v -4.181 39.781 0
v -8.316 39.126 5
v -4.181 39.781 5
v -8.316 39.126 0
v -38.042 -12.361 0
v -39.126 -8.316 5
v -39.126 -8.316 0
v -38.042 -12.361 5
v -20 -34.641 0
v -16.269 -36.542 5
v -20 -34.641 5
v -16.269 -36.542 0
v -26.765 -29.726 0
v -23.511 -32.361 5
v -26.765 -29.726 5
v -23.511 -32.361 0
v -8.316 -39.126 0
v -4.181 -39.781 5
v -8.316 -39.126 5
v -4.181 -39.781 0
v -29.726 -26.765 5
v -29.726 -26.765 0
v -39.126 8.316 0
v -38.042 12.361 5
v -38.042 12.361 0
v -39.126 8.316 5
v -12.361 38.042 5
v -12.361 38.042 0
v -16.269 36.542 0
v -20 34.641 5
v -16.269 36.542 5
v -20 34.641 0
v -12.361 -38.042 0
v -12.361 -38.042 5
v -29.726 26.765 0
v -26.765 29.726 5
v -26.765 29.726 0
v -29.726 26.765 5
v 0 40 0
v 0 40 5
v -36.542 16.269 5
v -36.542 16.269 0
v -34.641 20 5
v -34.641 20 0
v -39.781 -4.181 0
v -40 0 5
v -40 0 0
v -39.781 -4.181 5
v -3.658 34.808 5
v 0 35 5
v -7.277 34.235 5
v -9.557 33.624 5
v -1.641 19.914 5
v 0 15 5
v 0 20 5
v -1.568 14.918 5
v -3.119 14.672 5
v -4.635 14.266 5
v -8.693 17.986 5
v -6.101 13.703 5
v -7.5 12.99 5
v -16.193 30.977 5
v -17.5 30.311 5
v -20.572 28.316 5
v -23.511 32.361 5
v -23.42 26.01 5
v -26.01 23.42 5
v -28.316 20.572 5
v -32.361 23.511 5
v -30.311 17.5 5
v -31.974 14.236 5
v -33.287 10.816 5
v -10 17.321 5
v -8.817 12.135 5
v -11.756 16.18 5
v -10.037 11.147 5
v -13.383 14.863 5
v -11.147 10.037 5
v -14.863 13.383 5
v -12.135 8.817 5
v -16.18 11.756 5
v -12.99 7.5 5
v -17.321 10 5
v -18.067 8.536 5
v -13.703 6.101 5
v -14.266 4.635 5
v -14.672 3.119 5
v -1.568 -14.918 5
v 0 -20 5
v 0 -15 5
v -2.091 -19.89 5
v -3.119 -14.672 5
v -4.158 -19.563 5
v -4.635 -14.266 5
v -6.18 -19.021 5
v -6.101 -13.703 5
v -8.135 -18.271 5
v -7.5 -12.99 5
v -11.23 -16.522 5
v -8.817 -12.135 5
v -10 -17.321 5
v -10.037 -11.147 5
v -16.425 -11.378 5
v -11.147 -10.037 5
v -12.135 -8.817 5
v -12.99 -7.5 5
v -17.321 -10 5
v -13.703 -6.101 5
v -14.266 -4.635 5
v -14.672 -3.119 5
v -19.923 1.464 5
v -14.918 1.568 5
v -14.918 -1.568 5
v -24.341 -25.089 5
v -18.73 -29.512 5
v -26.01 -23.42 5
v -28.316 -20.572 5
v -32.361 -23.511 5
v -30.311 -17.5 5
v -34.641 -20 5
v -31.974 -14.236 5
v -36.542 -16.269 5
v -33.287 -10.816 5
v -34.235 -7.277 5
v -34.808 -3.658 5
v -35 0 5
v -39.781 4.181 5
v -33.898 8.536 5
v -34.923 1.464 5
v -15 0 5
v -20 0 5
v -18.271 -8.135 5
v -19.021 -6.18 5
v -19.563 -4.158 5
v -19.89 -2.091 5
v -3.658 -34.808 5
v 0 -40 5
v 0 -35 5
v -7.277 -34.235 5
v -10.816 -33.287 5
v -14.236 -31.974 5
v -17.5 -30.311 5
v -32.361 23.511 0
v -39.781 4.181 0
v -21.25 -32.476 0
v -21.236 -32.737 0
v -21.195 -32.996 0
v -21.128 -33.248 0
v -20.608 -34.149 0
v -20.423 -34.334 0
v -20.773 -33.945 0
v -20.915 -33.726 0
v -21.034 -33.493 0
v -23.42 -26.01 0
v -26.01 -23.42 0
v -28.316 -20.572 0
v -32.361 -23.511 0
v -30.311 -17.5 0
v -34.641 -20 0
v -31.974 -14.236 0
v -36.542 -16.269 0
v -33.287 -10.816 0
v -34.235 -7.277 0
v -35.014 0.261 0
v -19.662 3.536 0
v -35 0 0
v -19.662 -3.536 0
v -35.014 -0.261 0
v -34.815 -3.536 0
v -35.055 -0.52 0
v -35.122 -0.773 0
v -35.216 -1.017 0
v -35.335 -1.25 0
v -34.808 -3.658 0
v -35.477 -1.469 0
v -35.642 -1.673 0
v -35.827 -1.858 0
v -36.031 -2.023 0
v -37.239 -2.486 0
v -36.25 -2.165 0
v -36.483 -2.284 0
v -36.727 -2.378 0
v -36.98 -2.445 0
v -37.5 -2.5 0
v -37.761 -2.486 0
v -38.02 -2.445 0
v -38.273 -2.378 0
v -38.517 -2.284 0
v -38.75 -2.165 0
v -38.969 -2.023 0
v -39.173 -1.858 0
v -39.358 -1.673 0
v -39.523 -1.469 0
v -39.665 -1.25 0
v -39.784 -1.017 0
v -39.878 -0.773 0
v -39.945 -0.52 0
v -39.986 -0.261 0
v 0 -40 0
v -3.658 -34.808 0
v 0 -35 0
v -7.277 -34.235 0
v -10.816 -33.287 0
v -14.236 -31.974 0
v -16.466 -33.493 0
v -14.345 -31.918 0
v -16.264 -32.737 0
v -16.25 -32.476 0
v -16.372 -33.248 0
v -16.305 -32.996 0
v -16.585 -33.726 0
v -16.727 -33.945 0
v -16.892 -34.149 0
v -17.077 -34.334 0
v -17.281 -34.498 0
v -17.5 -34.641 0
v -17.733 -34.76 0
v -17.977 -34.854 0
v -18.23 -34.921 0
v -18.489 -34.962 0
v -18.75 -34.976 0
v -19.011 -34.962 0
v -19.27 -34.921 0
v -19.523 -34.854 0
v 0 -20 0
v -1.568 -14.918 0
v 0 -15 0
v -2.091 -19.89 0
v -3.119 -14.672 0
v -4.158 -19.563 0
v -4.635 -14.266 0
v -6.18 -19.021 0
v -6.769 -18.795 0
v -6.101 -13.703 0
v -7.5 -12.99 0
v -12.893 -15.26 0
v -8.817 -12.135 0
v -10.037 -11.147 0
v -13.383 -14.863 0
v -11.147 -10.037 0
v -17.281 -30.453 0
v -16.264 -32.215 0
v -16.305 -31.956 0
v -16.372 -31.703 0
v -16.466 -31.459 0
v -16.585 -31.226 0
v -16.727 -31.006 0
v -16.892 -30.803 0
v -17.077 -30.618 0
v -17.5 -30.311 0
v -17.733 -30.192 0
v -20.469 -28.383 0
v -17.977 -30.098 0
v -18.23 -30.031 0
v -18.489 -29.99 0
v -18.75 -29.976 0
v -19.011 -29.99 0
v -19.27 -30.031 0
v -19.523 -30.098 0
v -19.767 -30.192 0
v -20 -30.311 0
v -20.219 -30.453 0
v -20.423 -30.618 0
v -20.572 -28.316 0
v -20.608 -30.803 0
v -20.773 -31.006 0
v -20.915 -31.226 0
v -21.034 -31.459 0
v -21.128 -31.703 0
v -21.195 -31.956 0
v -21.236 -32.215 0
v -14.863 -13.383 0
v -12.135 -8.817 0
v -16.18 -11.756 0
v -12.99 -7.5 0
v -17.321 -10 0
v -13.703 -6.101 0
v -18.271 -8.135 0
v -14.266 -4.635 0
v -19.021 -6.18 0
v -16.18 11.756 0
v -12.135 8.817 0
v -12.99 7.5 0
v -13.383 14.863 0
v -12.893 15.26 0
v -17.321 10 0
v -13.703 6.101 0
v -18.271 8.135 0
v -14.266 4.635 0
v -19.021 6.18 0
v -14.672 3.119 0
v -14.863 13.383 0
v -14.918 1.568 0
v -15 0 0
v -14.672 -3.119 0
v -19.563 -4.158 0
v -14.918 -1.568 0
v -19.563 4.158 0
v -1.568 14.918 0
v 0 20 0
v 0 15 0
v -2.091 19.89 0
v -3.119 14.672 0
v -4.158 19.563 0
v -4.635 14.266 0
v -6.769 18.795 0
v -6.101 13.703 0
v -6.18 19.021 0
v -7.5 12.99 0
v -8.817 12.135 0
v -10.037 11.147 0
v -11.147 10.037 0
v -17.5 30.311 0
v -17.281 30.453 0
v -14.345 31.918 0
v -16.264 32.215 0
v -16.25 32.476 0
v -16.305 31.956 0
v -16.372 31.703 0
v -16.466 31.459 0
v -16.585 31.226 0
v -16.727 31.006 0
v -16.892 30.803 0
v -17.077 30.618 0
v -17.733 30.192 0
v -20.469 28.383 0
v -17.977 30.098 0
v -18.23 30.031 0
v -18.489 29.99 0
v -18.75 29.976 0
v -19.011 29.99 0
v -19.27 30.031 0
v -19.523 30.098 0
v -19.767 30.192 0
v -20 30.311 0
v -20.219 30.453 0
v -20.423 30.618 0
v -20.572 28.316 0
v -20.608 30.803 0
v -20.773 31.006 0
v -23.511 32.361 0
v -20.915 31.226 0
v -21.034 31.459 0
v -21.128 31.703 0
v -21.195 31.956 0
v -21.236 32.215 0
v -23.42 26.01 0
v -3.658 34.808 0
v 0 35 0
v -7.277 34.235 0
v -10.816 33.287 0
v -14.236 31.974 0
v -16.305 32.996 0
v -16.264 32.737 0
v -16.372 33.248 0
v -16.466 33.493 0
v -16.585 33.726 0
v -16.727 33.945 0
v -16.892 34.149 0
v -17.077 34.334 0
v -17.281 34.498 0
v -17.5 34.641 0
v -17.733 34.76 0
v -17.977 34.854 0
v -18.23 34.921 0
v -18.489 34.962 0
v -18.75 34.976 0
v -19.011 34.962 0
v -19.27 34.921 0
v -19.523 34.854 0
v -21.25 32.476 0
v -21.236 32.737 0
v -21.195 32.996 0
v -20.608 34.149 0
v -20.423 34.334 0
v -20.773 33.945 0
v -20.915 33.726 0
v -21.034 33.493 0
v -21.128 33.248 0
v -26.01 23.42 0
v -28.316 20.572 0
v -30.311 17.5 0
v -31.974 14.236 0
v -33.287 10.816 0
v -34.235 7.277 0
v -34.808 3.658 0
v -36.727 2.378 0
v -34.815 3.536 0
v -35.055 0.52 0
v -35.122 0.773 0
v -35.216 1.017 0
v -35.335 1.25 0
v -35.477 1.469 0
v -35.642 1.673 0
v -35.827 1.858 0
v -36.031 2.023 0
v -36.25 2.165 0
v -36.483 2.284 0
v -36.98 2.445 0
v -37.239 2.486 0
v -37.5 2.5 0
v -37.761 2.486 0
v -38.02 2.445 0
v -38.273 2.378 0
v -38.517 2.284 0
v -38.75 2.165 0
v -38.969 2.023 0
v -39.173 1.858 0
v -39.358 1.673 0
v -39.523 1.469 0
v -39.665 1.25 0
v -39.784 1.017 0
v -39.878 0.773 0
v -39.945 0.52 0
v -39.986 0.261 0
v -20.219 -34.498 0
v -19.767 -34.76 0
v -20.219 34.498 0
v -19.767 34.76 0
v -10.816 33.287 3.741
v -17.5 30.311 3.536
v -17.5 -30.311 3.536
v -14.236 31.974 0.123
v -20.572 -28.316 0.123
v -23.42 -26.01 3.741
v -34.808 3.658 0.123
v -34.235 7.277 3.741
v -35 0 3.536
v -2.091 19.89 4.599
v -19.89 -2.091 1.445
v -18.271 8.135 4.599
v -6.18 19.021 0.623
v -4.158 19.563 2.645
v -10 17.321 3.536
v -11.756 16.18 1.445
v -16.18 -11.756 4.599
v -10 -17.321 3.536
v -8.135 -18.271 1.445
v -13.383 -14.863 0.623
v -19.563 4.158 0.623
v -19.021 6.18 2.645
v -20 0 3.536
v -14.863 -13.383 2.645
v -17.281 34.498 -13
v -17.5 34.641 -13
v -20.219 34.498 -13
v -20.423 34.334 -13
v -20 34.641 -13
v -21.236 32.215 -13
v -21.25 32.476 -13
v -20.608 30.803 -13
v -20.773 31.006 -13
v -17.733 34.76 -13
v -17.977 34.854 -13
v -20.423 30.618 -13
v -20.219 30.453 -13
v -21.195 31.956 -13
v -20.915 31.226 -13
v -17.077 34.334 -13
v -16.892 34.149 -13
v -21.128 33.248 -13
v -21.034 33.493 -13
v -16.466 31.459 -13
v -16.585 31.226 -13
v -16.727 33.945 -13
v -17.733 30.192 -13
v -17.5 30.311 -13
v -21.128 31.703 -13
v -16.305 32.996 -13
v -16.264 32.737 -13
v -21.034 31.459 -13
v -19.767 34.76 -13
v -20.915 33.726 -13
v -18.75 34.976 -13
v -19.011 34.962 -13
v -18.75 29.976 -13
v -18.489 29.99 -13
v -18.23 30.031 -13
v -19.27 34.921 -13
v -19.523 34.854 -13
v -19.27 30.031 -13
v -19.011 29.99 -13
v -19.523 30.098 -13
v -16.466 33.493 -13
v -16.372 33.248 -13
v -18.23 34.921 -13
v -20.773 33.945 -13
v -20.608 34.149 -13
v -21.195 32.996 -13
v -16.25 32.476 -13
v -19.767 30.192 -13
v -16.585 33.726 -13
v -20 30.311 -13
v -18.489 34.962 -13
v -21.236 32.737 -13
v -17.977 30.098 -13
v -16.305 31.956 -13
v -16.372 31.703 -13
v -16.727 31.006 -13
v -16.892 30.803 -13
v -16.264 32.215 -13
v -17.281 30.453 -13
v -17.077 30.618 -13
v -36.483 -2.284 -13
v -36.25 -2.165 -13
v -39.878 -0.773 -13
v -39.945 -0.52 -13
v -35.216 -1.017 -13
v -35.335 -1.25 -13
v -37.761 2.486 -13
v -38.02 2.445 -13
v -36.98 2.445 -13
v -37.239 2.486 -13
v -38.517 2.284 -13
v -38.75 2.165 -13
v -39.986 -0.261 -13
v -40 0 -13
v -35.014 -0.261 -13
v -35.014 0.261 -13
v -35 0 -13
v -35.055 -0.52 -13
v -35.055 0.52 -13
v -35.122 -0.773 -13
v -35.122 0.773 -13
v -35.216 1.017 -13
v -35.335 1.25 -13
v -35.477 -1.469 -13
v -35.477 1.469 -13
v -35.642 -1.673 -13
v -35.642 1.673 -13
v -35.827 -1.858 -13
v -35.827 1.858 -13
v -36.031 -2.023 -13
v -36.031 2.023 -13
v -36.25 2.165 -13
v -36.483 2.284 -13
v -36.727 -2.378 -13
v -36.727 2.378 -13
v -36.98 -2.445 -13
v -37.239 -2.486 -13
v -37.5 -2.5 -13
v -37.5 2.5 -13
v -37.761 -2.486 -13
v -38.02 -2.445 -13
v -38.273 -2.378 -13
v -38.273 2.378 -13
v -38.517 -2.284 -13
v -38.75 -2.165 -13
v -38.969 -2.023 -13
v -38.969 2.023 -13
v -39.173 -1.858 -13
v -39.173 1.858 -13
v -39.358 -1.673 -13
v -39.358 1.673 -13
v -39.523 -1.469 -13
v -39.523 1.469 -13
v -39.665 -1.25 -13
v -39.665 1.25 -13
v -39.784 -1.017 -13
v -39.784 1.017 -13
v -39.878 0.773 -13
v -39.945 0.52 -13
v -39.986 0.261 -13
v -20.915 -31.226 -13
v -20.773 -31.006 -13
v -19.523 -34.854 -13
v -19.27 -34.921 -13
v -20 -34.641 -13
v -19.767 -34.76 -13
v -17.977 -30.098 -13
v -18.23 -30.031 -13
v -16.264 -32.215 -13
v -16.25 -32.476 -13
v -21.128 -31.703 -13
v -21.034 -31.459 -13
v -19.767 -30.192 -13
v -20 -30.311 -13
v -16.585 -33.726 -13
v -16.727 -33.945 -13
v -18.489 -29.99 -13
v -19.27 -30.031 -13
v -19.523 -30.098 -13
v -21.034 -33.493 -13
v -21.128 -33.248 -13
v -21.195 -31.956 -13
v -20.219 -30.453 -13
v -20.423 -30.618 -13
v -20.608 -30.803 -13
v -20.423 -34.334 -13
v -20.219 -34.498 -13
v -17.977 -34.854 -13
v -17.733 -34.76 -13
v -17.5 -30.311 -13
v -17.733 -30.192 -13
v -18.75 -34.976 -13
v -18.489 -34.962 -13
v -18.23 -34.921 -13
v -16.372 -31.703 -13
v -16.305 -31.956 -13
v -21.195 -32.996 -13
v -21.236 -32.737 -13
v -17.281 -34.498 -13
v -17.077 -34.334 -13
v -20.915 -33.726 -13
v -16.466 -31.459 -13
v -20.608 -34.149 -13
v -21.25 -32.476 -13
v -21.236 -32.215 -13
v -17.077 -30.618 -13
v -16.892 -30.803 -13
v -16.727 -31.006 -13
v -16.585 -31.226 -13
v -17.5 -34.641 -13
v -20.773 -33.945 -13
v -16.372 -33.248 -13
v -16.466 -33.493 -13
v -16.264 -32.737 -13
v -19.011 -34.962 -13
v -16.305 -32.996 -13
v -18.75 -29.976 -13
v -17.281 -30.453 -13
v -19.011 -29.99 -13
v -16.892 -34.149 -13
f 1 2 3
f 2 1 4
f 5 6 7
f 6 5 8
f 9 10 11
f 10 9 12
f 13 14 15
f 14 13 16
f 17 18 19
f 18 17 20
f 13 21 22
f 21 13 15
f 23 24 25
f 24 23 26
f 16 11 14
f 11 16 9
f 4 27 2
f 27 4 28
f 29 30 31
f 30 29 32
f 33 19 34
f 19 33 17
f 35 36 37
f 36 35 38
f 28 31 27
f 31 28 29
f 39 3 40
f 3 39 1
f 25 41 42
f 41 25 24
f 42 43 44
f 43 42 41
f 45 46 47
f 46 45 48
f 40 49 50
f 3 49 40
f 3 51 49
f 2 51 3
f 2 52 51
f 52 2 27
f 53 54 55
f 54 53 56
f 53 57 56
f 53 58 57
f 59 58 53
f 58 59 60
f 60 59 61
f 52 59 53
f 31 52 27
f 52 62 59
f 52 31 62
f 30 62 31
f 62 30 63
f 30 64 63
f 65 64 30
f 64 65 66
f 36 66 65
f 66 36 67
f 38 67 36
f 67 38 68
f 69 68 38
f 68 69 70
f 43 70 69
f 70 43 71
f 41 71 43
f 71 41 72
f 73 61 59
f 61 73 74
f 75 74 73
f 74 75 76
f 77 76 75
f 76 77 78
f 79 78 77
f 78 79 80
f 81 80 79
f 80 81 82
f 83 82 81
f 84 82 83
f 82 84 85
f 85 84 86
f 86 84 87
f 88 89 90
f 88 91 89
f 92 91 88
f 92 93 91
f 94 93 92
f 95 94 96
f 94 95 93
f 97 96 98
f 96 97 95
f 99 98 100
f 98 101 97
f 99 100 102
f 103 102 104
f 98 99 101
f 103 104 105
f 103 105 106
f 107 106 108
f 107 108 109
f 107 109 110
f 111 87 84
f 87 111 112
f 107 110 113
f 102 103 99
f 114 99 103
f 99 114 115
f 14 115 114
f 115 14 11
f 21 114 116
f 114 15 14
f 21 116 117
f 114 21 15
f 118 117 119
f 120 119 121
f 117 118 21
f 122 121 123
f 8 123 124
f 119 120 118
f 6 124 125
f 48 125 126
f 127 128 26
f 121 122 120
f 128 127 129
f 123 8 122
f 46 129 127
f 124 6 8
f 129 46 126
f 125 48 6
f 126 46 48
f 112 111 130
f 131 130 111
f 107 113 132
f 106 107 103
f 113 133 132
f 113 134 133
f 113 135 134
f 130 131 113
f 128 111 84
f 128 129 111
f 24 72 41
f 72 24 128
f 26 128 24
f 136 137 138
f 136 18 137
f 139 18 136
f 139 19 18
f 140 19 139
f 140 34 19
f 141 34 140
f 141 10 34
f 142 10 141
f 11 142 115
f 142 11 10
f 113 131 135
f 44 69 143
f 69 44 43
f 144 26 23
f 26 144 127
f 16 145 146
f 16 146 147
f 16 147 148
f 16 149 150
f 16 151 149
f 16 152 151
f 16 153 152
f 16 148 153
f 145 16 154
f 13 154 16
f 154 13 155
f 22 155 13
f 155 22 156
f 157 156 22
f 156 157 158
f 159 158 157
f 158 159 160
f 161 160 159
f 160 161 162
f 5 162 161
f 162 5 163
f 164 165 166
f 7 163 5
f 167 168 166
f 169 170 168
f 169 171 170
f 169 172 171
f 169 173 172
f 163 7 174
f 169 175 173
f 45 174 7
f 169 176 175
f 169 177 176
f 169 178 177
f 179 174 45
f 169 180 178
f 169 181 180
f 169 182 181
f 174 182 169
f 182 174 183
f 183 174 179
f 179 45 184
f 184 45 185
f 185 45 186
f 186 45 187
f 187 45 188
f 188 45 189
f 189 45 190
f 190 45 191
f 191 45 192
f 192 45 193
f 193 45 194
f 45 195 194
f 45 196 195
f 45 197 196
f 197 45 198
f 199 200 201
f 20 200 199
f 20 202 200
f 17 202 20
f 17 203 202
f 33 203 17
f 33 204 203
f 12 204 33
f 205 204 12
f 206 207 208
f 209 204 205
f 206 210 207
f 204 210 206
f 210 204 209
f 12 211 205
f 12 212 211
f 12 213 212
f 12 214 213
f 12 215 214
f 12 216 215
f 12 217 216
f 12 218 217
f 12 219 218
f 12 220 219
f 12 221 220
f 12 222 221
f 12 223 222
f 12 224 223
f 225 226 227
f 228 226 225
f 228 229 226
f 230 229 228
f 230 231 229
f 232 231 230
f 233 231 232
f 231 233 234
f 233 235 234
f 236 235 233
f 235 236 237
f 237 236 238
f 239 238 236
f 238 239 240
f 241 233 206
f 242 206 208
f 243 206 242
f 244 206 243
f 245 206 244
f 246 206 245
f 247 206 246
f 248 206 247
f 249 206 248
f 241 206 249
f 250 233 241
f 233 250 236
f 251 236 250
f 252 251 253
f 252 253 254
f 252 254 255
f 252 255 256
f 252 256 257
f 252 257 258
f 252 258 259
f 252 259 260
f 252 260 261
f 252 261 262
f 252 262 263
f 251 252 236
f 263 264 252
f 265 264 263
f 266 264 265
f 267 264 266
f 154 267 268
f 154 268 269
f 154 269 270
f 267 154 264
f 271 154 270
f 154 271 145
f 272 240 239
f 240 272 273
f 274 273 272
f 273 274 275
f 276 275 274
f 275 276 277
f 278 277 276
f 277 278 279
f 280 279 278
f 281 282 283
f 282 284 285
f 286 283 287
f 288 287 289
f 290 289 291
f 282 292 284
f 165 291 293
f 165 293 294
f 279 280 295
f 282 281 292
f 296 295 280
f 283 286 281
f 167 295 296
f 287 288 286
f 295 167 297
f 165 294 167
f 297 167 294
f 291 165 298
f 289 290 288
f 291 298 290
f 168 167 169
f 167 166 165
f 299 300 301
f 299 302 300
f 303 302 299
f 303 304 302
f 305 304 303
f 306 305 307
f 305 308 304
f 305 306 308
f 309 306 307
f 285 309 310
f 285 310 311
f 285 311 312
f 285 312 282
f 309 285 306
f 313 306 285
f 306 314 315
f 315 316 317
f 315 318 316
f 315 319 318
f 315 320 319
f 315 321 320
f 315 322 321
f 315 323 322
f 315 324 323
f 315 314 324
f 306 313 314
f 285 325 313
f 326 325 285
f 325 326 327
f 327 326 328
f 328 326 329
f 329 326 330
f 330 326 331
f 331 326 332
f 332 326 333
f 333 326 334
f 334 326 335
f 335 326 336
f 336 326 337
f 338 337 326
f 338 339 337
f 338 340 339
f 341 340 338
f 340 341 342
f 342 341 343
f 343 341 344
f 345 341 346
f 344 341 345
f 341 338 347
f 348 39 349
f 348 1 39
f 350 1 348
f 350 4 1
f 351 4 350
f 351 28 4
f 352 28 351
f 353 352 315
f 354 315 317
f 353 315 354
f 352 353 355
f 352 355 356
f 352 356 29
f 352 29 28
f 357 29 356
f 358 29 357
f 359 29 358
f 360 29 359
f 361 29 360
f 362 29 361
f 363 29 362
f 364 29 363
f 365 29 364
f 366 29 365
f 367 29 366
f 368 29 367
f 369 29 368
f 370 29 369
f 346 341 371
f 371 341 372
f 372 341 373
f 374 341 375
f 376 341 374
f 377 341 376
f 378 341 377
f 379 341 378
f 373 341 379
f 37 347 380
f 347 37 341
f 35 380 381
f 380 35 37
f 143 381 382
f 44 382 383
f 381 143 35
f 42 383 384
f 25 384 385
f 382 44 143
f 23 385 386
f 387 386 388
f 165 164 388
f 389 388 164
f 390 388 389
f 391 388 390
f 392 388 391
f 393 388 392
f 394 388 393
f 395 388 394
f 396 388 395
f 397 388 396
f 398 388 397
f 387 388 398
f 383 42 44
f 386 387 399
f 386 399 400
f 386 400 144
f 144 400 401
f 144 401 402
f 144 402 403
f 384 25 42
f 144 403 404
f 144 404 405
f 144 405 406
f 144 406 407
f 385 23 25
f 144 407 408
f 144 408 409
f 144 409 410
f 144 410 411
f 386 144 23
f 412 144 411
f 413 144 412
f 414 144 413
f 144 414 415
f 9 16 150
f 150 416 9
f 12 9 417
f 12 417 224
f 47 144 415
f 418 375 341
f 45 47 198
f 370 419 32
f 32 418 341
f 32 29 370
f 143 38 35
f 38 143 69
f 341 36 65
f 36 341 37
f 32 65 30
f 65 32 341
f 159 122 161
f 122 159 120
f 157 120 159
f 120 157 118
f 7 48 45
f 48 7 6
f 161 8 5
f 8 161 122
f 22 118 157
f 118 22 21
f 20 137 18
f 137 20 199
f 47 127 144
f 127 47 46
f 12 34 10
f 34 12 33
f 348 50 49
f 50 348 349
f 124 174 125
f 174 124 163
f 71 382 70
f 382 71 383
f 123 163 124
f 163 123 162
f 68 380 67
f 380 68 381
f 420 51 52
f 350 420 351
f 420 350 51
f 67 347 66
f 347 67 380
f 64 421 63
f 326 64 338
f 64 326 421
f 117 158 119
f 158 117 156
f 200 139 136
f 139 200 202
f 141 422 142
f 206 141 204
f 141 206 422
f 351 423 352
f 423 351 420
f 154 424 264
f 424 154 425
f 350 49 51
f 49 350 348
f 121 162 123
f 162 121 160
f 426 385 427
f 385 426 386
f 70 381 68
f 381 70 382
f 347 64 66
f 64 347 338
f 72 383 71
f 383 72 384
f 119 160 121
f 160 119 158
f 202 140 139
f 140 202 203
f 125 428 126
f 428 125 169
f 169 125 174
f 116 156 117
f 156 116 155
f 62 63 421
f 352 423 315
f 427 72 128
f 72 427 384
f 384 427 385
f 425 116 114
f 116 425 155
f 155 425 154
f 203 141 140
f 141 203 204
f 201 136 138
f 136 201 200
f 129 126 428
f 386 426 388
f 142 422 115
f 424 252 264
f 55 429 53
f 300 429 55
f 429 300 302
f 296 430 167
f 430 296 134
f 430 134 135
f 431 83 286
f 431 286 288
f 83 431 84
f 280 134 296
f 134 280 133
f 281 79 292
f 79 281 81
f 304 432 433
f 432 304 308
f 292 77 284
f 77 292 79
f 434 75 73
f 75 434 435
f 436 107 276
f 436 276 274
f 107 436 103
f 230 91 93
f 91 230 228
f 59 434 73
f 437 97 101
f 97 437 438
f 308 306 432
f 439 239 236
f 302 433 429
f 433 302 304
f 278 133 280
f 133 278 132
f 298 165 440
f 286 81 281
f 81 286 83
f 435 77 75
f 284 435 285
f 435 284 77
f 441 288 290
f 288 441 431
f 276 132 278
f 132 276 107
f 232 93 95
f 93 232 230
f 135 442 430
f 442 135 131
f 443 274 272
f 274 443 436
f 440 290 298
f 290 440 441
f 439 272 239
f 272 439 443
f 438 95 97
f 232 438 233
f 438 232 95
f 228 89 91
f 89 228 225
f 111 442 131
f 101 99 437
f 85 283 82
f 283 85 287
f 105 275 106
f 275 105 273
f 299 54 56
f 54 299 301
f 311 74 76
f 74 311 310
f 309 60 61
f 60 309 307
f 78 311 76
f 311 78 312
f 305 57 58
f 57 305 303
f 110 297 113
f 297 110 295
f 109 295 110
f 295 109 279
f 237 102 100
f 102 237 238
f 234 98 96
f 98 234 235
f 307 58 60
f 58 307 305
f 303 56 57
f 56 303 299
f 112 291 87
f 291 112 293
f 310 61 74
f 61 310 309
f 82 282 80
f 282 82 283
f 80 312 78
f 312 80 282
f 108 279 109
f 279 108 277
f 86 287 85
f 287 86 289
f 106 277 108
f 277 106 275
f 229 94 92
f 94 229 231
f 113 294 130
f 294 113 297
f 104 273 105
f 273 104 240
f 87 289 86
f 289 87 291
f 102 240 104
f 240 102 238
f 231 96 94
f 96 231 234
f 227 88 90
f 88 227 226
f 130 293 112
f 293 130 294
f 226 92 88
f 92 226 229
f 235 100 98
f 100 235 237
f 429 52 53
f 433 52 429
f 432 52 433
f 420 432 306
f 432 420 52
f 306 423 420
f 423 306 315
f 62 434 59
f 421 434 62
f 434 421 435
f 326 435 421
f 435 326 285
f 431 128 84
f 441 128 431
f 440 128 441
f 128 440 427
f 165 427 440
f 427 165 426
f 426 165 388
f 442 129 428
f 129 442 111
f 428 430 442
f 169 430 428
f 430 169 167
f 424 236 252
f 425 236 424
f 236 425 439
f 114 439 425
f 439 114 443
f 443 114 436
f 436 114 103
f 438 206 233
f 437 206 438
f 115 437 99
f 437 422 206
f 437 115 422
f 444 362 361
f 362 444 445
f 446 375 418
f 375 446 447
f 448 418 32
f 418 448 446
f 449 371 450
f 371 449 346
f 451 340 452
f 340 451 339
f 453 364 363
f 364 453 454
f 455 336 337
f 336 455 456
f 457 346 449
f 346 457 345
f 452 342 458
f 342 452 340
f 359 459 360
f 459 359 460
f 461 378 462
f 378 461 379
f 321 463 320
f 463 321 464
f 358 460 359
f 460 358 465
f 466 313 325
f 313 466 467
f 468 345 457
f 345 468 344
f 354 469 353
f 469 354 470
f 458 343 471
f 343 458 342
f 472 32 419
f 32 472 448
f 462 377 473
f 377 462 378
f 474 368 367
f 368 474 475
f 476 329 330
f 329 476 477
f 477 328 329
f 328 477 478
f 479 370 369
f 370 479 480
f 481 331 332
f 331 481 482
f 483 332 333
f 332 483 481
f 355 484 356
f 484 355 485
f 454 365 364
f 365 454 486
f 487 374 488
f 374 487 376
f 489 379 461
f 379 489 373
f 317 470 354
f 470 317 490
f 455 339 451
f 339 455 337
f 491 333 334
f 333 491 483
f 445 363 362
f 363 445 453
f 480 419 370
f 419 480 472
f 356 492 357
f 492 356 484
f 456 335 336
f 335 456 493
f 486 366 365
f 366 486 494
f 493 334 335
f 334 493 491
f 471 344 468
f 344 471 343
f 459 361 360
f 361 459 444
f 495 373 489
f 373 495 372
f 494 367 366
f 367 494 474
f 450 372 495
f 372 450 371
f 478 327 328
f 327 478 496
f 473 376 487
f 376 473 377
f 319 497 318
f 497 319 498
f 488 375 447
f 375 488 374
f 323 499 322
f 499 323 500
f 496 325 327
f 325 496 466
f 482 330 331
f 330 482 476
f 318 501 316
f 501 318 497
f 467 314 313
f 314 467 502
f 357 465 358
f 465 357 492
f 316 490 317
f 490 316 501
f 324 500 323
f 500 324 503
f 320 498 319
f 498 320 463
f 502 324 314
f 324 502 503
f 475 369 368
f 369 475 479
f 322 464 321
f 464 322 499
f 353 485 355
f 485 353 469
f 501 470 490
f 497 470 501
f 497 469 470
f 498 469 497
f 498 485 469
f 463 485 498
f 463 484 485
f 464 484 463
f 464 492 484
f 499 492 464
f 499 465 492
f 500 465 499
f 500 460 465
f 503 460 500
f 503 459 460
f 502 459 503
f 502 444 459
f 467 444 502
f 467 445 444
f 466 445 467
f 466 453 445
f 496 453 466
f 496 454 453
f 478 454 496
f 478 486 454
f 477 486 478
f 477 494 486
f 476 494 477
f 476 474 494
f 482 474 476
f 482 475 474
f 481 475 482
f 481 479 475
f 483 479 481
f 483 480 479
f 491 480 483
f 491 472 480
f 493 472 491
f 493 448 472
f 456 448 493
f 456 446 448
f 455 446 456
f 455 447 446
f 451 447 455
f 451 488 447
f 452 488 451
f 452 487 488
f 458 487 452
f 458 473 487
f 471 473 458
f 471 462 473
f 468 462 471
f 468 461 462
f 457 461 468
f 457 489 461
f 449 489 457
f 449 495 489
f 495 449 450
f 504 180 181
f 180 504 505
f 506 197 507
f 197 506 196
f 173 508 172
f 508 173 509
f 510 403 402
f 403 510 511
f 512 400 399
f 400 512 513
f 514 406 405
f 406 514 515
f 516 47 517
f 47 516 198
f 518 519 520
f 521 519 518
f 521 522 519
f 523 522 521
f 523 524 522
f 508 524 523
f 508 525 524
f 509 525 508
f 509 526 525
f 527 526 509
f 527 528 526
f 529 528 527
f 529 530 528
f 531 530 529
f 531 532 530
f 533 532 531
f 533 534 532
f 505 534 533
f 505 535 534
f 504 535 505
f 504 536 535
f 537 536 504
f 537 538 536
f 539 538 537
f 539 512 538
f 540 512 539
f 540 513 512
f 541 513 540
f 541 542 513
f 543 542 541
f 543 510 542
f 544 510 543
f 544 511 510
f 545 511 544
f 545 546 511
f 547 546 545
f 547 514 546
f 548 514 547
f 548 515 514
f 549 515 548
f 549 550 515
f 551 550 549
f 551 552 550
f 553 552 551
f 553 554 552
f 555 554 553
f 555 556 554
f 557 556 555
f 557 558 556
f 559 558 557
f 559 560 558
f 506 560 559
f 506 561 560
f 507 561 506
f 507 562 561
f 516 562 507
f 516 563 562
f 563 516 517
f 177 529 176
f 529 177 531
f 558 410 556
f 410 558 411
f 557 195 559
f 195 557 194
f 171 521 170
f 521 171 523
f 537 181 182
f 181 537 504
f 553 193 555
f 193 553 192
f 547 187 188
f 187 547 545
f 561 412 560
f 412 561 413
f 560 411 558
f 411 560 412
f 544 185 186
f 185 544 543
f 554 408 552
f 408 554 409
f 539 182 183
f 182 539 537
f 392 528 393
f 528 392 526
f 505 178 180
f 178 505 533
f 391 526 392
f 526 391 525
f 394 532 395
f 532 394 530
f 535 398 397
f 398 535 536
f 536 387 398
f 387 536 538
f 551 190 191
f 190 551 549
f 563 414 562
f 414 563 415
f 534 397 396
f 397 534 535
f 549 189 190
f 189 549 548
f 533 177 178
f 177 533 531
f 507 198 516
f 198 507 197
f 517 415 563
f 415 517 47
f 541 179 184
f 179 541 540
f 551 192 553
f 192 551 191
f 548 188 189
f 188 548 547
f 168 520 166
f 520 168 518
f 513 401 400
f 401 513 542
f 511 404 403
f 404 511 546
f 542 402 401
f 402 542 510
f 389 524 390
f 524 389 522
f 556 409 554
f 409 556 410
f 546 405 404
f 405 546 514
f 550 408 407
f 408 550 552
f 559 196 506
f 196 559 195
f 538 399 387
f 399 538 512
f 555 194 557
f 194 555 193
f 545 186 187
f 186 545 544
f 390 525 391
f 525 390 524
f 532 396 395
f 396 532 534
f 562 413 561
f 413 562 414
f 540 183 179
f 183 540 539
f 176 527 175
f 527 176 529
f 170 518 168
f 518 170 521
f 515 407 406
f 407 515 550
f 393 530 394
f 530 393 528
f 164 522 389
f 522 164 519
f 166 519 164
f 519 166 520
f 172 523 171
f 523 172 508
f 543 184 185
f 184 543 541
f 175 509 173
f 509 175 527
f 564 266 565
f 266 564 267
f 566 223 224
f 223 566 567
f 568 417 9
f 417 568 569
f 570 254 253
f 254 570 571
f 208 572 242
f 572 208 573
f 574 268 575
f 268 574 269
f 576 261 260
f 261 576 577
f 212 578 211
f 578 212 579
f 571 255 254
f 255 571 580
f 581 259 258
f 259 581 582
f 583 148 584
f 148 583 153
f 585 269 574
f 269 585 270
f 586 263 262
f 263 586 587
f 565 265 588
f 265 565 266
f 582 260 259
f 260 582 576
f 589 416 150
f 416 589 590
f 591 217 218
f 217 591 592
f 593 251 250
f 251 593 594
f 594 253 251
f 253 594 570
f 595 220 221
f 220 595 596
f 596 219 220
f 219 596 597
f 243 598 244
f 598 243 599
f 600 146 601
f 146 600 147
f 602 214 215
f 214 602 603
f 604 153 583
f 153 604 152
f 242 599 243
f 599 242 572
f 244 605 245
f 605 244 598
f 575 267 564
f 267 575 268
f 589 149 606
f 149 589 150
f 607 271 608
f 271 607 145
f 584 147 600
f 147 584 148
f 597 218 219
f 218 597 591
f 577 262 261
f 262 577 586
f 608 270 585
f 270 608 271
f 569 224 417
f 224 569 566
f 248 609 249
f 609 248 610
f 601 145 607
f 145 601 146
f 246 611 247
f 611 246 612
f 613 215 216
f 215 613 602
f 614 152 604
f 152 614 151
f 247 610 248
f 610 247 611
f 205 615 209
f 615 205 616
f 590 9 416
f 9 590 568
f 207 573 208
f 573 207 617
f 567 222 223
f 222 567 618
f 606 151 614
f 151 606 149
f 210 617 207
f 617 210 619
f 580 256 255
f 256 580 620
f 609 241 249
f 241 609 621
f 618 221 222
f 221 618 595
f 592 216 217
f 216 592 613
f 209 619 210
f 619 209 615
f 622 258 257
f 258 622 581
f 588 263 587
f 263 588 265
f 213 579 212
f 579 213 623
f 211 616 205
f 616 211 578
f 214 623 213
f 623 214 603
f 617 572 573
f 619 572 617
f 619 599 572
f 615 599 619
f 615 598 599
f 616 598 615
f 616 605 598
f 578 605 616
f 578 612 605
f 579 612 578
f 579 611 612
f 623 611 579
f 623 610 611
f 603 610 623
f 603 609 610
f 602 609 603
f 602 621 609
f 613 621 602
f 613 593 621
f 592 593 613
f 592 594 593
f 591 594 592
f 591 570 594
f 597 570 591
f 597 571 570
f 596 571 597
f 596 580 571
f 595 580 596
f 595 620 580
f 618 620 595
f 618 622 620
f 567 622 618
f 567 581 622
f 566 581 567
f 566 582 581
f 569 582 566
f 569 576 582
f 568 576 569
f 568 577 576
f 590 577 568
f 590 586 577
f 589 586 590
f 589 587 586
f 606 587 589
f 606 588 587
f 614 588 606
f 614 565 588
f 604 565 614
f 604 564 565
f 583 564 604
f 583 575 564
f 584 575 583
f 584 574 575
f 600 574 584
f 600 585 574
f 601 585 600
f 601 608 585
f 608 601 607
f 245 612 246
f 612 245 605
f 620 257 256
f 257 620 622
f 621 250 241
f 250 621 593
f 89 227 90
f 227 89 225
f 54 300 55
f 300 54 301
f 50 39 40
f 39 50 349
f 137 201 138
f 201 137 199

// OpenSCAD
// 2021-02-08 water bath turbine circulator

beakerDiameter = 80;
stirRodDiameter = 8;
thickness = 5;
fanBlades = 6;
legs = 6;

beakerRadius = beakerDiameter / 2;
stirRodRadius = stirRodDiameter / 2;

$fn = 60;
$vpr=[55,0,$t*60];
$vpt = [0,0,-10];
$vpd = 160;

difference(){
    translate([0,0,0]){
        // Outer ring
        difference(){
            cylinder(thickness, beakerRadius, beakerRadius);
            cylinder(thickness*3, beakerRadius-thickness, beakerRadius-thickness, center = true);
        }

        // Inner ring
        difference(){
            cylinder(thickness, beakerRadius/2, beakerRadius/2);
            cylinder(thickness*3, beakerRadius/2-thickness, beakerRadius/2-thickness, center = true);
        }

        // Fan blades
        intersection(){
            for(i = [0:360/fanBlades:360]){
                rotate([0,0,i]){
                    translate([beakerRadius/2, 0, 0]){
                        rotate([45,0,0]){
                            cube([beakerRadius, thickness, beakerDiameter], center = true);
                        }
                    }
                }
            }
            difference(){
                cylinder(thickness, beakerRadius, beakerRadius);
                cylinder(thickness*3, beakerRadius/2, beakerRadius/2, center = true);
            }
        }

        // Feet
        for(i = [0:360/legs:360]){
            rotate([0,0,i]){
                translate([beakerRadius - thickness/2,0,-stirRodDiameter - thickness]){
                    cylinder(stirRodDiameter+thickness*1.5, thickness/2, thickness/2);
                }
            }
        }
    }
    translate([0,-beakerRadius,-50]){
        cube([beakerRadius, beakerDiameter, 100]);
    }
}
